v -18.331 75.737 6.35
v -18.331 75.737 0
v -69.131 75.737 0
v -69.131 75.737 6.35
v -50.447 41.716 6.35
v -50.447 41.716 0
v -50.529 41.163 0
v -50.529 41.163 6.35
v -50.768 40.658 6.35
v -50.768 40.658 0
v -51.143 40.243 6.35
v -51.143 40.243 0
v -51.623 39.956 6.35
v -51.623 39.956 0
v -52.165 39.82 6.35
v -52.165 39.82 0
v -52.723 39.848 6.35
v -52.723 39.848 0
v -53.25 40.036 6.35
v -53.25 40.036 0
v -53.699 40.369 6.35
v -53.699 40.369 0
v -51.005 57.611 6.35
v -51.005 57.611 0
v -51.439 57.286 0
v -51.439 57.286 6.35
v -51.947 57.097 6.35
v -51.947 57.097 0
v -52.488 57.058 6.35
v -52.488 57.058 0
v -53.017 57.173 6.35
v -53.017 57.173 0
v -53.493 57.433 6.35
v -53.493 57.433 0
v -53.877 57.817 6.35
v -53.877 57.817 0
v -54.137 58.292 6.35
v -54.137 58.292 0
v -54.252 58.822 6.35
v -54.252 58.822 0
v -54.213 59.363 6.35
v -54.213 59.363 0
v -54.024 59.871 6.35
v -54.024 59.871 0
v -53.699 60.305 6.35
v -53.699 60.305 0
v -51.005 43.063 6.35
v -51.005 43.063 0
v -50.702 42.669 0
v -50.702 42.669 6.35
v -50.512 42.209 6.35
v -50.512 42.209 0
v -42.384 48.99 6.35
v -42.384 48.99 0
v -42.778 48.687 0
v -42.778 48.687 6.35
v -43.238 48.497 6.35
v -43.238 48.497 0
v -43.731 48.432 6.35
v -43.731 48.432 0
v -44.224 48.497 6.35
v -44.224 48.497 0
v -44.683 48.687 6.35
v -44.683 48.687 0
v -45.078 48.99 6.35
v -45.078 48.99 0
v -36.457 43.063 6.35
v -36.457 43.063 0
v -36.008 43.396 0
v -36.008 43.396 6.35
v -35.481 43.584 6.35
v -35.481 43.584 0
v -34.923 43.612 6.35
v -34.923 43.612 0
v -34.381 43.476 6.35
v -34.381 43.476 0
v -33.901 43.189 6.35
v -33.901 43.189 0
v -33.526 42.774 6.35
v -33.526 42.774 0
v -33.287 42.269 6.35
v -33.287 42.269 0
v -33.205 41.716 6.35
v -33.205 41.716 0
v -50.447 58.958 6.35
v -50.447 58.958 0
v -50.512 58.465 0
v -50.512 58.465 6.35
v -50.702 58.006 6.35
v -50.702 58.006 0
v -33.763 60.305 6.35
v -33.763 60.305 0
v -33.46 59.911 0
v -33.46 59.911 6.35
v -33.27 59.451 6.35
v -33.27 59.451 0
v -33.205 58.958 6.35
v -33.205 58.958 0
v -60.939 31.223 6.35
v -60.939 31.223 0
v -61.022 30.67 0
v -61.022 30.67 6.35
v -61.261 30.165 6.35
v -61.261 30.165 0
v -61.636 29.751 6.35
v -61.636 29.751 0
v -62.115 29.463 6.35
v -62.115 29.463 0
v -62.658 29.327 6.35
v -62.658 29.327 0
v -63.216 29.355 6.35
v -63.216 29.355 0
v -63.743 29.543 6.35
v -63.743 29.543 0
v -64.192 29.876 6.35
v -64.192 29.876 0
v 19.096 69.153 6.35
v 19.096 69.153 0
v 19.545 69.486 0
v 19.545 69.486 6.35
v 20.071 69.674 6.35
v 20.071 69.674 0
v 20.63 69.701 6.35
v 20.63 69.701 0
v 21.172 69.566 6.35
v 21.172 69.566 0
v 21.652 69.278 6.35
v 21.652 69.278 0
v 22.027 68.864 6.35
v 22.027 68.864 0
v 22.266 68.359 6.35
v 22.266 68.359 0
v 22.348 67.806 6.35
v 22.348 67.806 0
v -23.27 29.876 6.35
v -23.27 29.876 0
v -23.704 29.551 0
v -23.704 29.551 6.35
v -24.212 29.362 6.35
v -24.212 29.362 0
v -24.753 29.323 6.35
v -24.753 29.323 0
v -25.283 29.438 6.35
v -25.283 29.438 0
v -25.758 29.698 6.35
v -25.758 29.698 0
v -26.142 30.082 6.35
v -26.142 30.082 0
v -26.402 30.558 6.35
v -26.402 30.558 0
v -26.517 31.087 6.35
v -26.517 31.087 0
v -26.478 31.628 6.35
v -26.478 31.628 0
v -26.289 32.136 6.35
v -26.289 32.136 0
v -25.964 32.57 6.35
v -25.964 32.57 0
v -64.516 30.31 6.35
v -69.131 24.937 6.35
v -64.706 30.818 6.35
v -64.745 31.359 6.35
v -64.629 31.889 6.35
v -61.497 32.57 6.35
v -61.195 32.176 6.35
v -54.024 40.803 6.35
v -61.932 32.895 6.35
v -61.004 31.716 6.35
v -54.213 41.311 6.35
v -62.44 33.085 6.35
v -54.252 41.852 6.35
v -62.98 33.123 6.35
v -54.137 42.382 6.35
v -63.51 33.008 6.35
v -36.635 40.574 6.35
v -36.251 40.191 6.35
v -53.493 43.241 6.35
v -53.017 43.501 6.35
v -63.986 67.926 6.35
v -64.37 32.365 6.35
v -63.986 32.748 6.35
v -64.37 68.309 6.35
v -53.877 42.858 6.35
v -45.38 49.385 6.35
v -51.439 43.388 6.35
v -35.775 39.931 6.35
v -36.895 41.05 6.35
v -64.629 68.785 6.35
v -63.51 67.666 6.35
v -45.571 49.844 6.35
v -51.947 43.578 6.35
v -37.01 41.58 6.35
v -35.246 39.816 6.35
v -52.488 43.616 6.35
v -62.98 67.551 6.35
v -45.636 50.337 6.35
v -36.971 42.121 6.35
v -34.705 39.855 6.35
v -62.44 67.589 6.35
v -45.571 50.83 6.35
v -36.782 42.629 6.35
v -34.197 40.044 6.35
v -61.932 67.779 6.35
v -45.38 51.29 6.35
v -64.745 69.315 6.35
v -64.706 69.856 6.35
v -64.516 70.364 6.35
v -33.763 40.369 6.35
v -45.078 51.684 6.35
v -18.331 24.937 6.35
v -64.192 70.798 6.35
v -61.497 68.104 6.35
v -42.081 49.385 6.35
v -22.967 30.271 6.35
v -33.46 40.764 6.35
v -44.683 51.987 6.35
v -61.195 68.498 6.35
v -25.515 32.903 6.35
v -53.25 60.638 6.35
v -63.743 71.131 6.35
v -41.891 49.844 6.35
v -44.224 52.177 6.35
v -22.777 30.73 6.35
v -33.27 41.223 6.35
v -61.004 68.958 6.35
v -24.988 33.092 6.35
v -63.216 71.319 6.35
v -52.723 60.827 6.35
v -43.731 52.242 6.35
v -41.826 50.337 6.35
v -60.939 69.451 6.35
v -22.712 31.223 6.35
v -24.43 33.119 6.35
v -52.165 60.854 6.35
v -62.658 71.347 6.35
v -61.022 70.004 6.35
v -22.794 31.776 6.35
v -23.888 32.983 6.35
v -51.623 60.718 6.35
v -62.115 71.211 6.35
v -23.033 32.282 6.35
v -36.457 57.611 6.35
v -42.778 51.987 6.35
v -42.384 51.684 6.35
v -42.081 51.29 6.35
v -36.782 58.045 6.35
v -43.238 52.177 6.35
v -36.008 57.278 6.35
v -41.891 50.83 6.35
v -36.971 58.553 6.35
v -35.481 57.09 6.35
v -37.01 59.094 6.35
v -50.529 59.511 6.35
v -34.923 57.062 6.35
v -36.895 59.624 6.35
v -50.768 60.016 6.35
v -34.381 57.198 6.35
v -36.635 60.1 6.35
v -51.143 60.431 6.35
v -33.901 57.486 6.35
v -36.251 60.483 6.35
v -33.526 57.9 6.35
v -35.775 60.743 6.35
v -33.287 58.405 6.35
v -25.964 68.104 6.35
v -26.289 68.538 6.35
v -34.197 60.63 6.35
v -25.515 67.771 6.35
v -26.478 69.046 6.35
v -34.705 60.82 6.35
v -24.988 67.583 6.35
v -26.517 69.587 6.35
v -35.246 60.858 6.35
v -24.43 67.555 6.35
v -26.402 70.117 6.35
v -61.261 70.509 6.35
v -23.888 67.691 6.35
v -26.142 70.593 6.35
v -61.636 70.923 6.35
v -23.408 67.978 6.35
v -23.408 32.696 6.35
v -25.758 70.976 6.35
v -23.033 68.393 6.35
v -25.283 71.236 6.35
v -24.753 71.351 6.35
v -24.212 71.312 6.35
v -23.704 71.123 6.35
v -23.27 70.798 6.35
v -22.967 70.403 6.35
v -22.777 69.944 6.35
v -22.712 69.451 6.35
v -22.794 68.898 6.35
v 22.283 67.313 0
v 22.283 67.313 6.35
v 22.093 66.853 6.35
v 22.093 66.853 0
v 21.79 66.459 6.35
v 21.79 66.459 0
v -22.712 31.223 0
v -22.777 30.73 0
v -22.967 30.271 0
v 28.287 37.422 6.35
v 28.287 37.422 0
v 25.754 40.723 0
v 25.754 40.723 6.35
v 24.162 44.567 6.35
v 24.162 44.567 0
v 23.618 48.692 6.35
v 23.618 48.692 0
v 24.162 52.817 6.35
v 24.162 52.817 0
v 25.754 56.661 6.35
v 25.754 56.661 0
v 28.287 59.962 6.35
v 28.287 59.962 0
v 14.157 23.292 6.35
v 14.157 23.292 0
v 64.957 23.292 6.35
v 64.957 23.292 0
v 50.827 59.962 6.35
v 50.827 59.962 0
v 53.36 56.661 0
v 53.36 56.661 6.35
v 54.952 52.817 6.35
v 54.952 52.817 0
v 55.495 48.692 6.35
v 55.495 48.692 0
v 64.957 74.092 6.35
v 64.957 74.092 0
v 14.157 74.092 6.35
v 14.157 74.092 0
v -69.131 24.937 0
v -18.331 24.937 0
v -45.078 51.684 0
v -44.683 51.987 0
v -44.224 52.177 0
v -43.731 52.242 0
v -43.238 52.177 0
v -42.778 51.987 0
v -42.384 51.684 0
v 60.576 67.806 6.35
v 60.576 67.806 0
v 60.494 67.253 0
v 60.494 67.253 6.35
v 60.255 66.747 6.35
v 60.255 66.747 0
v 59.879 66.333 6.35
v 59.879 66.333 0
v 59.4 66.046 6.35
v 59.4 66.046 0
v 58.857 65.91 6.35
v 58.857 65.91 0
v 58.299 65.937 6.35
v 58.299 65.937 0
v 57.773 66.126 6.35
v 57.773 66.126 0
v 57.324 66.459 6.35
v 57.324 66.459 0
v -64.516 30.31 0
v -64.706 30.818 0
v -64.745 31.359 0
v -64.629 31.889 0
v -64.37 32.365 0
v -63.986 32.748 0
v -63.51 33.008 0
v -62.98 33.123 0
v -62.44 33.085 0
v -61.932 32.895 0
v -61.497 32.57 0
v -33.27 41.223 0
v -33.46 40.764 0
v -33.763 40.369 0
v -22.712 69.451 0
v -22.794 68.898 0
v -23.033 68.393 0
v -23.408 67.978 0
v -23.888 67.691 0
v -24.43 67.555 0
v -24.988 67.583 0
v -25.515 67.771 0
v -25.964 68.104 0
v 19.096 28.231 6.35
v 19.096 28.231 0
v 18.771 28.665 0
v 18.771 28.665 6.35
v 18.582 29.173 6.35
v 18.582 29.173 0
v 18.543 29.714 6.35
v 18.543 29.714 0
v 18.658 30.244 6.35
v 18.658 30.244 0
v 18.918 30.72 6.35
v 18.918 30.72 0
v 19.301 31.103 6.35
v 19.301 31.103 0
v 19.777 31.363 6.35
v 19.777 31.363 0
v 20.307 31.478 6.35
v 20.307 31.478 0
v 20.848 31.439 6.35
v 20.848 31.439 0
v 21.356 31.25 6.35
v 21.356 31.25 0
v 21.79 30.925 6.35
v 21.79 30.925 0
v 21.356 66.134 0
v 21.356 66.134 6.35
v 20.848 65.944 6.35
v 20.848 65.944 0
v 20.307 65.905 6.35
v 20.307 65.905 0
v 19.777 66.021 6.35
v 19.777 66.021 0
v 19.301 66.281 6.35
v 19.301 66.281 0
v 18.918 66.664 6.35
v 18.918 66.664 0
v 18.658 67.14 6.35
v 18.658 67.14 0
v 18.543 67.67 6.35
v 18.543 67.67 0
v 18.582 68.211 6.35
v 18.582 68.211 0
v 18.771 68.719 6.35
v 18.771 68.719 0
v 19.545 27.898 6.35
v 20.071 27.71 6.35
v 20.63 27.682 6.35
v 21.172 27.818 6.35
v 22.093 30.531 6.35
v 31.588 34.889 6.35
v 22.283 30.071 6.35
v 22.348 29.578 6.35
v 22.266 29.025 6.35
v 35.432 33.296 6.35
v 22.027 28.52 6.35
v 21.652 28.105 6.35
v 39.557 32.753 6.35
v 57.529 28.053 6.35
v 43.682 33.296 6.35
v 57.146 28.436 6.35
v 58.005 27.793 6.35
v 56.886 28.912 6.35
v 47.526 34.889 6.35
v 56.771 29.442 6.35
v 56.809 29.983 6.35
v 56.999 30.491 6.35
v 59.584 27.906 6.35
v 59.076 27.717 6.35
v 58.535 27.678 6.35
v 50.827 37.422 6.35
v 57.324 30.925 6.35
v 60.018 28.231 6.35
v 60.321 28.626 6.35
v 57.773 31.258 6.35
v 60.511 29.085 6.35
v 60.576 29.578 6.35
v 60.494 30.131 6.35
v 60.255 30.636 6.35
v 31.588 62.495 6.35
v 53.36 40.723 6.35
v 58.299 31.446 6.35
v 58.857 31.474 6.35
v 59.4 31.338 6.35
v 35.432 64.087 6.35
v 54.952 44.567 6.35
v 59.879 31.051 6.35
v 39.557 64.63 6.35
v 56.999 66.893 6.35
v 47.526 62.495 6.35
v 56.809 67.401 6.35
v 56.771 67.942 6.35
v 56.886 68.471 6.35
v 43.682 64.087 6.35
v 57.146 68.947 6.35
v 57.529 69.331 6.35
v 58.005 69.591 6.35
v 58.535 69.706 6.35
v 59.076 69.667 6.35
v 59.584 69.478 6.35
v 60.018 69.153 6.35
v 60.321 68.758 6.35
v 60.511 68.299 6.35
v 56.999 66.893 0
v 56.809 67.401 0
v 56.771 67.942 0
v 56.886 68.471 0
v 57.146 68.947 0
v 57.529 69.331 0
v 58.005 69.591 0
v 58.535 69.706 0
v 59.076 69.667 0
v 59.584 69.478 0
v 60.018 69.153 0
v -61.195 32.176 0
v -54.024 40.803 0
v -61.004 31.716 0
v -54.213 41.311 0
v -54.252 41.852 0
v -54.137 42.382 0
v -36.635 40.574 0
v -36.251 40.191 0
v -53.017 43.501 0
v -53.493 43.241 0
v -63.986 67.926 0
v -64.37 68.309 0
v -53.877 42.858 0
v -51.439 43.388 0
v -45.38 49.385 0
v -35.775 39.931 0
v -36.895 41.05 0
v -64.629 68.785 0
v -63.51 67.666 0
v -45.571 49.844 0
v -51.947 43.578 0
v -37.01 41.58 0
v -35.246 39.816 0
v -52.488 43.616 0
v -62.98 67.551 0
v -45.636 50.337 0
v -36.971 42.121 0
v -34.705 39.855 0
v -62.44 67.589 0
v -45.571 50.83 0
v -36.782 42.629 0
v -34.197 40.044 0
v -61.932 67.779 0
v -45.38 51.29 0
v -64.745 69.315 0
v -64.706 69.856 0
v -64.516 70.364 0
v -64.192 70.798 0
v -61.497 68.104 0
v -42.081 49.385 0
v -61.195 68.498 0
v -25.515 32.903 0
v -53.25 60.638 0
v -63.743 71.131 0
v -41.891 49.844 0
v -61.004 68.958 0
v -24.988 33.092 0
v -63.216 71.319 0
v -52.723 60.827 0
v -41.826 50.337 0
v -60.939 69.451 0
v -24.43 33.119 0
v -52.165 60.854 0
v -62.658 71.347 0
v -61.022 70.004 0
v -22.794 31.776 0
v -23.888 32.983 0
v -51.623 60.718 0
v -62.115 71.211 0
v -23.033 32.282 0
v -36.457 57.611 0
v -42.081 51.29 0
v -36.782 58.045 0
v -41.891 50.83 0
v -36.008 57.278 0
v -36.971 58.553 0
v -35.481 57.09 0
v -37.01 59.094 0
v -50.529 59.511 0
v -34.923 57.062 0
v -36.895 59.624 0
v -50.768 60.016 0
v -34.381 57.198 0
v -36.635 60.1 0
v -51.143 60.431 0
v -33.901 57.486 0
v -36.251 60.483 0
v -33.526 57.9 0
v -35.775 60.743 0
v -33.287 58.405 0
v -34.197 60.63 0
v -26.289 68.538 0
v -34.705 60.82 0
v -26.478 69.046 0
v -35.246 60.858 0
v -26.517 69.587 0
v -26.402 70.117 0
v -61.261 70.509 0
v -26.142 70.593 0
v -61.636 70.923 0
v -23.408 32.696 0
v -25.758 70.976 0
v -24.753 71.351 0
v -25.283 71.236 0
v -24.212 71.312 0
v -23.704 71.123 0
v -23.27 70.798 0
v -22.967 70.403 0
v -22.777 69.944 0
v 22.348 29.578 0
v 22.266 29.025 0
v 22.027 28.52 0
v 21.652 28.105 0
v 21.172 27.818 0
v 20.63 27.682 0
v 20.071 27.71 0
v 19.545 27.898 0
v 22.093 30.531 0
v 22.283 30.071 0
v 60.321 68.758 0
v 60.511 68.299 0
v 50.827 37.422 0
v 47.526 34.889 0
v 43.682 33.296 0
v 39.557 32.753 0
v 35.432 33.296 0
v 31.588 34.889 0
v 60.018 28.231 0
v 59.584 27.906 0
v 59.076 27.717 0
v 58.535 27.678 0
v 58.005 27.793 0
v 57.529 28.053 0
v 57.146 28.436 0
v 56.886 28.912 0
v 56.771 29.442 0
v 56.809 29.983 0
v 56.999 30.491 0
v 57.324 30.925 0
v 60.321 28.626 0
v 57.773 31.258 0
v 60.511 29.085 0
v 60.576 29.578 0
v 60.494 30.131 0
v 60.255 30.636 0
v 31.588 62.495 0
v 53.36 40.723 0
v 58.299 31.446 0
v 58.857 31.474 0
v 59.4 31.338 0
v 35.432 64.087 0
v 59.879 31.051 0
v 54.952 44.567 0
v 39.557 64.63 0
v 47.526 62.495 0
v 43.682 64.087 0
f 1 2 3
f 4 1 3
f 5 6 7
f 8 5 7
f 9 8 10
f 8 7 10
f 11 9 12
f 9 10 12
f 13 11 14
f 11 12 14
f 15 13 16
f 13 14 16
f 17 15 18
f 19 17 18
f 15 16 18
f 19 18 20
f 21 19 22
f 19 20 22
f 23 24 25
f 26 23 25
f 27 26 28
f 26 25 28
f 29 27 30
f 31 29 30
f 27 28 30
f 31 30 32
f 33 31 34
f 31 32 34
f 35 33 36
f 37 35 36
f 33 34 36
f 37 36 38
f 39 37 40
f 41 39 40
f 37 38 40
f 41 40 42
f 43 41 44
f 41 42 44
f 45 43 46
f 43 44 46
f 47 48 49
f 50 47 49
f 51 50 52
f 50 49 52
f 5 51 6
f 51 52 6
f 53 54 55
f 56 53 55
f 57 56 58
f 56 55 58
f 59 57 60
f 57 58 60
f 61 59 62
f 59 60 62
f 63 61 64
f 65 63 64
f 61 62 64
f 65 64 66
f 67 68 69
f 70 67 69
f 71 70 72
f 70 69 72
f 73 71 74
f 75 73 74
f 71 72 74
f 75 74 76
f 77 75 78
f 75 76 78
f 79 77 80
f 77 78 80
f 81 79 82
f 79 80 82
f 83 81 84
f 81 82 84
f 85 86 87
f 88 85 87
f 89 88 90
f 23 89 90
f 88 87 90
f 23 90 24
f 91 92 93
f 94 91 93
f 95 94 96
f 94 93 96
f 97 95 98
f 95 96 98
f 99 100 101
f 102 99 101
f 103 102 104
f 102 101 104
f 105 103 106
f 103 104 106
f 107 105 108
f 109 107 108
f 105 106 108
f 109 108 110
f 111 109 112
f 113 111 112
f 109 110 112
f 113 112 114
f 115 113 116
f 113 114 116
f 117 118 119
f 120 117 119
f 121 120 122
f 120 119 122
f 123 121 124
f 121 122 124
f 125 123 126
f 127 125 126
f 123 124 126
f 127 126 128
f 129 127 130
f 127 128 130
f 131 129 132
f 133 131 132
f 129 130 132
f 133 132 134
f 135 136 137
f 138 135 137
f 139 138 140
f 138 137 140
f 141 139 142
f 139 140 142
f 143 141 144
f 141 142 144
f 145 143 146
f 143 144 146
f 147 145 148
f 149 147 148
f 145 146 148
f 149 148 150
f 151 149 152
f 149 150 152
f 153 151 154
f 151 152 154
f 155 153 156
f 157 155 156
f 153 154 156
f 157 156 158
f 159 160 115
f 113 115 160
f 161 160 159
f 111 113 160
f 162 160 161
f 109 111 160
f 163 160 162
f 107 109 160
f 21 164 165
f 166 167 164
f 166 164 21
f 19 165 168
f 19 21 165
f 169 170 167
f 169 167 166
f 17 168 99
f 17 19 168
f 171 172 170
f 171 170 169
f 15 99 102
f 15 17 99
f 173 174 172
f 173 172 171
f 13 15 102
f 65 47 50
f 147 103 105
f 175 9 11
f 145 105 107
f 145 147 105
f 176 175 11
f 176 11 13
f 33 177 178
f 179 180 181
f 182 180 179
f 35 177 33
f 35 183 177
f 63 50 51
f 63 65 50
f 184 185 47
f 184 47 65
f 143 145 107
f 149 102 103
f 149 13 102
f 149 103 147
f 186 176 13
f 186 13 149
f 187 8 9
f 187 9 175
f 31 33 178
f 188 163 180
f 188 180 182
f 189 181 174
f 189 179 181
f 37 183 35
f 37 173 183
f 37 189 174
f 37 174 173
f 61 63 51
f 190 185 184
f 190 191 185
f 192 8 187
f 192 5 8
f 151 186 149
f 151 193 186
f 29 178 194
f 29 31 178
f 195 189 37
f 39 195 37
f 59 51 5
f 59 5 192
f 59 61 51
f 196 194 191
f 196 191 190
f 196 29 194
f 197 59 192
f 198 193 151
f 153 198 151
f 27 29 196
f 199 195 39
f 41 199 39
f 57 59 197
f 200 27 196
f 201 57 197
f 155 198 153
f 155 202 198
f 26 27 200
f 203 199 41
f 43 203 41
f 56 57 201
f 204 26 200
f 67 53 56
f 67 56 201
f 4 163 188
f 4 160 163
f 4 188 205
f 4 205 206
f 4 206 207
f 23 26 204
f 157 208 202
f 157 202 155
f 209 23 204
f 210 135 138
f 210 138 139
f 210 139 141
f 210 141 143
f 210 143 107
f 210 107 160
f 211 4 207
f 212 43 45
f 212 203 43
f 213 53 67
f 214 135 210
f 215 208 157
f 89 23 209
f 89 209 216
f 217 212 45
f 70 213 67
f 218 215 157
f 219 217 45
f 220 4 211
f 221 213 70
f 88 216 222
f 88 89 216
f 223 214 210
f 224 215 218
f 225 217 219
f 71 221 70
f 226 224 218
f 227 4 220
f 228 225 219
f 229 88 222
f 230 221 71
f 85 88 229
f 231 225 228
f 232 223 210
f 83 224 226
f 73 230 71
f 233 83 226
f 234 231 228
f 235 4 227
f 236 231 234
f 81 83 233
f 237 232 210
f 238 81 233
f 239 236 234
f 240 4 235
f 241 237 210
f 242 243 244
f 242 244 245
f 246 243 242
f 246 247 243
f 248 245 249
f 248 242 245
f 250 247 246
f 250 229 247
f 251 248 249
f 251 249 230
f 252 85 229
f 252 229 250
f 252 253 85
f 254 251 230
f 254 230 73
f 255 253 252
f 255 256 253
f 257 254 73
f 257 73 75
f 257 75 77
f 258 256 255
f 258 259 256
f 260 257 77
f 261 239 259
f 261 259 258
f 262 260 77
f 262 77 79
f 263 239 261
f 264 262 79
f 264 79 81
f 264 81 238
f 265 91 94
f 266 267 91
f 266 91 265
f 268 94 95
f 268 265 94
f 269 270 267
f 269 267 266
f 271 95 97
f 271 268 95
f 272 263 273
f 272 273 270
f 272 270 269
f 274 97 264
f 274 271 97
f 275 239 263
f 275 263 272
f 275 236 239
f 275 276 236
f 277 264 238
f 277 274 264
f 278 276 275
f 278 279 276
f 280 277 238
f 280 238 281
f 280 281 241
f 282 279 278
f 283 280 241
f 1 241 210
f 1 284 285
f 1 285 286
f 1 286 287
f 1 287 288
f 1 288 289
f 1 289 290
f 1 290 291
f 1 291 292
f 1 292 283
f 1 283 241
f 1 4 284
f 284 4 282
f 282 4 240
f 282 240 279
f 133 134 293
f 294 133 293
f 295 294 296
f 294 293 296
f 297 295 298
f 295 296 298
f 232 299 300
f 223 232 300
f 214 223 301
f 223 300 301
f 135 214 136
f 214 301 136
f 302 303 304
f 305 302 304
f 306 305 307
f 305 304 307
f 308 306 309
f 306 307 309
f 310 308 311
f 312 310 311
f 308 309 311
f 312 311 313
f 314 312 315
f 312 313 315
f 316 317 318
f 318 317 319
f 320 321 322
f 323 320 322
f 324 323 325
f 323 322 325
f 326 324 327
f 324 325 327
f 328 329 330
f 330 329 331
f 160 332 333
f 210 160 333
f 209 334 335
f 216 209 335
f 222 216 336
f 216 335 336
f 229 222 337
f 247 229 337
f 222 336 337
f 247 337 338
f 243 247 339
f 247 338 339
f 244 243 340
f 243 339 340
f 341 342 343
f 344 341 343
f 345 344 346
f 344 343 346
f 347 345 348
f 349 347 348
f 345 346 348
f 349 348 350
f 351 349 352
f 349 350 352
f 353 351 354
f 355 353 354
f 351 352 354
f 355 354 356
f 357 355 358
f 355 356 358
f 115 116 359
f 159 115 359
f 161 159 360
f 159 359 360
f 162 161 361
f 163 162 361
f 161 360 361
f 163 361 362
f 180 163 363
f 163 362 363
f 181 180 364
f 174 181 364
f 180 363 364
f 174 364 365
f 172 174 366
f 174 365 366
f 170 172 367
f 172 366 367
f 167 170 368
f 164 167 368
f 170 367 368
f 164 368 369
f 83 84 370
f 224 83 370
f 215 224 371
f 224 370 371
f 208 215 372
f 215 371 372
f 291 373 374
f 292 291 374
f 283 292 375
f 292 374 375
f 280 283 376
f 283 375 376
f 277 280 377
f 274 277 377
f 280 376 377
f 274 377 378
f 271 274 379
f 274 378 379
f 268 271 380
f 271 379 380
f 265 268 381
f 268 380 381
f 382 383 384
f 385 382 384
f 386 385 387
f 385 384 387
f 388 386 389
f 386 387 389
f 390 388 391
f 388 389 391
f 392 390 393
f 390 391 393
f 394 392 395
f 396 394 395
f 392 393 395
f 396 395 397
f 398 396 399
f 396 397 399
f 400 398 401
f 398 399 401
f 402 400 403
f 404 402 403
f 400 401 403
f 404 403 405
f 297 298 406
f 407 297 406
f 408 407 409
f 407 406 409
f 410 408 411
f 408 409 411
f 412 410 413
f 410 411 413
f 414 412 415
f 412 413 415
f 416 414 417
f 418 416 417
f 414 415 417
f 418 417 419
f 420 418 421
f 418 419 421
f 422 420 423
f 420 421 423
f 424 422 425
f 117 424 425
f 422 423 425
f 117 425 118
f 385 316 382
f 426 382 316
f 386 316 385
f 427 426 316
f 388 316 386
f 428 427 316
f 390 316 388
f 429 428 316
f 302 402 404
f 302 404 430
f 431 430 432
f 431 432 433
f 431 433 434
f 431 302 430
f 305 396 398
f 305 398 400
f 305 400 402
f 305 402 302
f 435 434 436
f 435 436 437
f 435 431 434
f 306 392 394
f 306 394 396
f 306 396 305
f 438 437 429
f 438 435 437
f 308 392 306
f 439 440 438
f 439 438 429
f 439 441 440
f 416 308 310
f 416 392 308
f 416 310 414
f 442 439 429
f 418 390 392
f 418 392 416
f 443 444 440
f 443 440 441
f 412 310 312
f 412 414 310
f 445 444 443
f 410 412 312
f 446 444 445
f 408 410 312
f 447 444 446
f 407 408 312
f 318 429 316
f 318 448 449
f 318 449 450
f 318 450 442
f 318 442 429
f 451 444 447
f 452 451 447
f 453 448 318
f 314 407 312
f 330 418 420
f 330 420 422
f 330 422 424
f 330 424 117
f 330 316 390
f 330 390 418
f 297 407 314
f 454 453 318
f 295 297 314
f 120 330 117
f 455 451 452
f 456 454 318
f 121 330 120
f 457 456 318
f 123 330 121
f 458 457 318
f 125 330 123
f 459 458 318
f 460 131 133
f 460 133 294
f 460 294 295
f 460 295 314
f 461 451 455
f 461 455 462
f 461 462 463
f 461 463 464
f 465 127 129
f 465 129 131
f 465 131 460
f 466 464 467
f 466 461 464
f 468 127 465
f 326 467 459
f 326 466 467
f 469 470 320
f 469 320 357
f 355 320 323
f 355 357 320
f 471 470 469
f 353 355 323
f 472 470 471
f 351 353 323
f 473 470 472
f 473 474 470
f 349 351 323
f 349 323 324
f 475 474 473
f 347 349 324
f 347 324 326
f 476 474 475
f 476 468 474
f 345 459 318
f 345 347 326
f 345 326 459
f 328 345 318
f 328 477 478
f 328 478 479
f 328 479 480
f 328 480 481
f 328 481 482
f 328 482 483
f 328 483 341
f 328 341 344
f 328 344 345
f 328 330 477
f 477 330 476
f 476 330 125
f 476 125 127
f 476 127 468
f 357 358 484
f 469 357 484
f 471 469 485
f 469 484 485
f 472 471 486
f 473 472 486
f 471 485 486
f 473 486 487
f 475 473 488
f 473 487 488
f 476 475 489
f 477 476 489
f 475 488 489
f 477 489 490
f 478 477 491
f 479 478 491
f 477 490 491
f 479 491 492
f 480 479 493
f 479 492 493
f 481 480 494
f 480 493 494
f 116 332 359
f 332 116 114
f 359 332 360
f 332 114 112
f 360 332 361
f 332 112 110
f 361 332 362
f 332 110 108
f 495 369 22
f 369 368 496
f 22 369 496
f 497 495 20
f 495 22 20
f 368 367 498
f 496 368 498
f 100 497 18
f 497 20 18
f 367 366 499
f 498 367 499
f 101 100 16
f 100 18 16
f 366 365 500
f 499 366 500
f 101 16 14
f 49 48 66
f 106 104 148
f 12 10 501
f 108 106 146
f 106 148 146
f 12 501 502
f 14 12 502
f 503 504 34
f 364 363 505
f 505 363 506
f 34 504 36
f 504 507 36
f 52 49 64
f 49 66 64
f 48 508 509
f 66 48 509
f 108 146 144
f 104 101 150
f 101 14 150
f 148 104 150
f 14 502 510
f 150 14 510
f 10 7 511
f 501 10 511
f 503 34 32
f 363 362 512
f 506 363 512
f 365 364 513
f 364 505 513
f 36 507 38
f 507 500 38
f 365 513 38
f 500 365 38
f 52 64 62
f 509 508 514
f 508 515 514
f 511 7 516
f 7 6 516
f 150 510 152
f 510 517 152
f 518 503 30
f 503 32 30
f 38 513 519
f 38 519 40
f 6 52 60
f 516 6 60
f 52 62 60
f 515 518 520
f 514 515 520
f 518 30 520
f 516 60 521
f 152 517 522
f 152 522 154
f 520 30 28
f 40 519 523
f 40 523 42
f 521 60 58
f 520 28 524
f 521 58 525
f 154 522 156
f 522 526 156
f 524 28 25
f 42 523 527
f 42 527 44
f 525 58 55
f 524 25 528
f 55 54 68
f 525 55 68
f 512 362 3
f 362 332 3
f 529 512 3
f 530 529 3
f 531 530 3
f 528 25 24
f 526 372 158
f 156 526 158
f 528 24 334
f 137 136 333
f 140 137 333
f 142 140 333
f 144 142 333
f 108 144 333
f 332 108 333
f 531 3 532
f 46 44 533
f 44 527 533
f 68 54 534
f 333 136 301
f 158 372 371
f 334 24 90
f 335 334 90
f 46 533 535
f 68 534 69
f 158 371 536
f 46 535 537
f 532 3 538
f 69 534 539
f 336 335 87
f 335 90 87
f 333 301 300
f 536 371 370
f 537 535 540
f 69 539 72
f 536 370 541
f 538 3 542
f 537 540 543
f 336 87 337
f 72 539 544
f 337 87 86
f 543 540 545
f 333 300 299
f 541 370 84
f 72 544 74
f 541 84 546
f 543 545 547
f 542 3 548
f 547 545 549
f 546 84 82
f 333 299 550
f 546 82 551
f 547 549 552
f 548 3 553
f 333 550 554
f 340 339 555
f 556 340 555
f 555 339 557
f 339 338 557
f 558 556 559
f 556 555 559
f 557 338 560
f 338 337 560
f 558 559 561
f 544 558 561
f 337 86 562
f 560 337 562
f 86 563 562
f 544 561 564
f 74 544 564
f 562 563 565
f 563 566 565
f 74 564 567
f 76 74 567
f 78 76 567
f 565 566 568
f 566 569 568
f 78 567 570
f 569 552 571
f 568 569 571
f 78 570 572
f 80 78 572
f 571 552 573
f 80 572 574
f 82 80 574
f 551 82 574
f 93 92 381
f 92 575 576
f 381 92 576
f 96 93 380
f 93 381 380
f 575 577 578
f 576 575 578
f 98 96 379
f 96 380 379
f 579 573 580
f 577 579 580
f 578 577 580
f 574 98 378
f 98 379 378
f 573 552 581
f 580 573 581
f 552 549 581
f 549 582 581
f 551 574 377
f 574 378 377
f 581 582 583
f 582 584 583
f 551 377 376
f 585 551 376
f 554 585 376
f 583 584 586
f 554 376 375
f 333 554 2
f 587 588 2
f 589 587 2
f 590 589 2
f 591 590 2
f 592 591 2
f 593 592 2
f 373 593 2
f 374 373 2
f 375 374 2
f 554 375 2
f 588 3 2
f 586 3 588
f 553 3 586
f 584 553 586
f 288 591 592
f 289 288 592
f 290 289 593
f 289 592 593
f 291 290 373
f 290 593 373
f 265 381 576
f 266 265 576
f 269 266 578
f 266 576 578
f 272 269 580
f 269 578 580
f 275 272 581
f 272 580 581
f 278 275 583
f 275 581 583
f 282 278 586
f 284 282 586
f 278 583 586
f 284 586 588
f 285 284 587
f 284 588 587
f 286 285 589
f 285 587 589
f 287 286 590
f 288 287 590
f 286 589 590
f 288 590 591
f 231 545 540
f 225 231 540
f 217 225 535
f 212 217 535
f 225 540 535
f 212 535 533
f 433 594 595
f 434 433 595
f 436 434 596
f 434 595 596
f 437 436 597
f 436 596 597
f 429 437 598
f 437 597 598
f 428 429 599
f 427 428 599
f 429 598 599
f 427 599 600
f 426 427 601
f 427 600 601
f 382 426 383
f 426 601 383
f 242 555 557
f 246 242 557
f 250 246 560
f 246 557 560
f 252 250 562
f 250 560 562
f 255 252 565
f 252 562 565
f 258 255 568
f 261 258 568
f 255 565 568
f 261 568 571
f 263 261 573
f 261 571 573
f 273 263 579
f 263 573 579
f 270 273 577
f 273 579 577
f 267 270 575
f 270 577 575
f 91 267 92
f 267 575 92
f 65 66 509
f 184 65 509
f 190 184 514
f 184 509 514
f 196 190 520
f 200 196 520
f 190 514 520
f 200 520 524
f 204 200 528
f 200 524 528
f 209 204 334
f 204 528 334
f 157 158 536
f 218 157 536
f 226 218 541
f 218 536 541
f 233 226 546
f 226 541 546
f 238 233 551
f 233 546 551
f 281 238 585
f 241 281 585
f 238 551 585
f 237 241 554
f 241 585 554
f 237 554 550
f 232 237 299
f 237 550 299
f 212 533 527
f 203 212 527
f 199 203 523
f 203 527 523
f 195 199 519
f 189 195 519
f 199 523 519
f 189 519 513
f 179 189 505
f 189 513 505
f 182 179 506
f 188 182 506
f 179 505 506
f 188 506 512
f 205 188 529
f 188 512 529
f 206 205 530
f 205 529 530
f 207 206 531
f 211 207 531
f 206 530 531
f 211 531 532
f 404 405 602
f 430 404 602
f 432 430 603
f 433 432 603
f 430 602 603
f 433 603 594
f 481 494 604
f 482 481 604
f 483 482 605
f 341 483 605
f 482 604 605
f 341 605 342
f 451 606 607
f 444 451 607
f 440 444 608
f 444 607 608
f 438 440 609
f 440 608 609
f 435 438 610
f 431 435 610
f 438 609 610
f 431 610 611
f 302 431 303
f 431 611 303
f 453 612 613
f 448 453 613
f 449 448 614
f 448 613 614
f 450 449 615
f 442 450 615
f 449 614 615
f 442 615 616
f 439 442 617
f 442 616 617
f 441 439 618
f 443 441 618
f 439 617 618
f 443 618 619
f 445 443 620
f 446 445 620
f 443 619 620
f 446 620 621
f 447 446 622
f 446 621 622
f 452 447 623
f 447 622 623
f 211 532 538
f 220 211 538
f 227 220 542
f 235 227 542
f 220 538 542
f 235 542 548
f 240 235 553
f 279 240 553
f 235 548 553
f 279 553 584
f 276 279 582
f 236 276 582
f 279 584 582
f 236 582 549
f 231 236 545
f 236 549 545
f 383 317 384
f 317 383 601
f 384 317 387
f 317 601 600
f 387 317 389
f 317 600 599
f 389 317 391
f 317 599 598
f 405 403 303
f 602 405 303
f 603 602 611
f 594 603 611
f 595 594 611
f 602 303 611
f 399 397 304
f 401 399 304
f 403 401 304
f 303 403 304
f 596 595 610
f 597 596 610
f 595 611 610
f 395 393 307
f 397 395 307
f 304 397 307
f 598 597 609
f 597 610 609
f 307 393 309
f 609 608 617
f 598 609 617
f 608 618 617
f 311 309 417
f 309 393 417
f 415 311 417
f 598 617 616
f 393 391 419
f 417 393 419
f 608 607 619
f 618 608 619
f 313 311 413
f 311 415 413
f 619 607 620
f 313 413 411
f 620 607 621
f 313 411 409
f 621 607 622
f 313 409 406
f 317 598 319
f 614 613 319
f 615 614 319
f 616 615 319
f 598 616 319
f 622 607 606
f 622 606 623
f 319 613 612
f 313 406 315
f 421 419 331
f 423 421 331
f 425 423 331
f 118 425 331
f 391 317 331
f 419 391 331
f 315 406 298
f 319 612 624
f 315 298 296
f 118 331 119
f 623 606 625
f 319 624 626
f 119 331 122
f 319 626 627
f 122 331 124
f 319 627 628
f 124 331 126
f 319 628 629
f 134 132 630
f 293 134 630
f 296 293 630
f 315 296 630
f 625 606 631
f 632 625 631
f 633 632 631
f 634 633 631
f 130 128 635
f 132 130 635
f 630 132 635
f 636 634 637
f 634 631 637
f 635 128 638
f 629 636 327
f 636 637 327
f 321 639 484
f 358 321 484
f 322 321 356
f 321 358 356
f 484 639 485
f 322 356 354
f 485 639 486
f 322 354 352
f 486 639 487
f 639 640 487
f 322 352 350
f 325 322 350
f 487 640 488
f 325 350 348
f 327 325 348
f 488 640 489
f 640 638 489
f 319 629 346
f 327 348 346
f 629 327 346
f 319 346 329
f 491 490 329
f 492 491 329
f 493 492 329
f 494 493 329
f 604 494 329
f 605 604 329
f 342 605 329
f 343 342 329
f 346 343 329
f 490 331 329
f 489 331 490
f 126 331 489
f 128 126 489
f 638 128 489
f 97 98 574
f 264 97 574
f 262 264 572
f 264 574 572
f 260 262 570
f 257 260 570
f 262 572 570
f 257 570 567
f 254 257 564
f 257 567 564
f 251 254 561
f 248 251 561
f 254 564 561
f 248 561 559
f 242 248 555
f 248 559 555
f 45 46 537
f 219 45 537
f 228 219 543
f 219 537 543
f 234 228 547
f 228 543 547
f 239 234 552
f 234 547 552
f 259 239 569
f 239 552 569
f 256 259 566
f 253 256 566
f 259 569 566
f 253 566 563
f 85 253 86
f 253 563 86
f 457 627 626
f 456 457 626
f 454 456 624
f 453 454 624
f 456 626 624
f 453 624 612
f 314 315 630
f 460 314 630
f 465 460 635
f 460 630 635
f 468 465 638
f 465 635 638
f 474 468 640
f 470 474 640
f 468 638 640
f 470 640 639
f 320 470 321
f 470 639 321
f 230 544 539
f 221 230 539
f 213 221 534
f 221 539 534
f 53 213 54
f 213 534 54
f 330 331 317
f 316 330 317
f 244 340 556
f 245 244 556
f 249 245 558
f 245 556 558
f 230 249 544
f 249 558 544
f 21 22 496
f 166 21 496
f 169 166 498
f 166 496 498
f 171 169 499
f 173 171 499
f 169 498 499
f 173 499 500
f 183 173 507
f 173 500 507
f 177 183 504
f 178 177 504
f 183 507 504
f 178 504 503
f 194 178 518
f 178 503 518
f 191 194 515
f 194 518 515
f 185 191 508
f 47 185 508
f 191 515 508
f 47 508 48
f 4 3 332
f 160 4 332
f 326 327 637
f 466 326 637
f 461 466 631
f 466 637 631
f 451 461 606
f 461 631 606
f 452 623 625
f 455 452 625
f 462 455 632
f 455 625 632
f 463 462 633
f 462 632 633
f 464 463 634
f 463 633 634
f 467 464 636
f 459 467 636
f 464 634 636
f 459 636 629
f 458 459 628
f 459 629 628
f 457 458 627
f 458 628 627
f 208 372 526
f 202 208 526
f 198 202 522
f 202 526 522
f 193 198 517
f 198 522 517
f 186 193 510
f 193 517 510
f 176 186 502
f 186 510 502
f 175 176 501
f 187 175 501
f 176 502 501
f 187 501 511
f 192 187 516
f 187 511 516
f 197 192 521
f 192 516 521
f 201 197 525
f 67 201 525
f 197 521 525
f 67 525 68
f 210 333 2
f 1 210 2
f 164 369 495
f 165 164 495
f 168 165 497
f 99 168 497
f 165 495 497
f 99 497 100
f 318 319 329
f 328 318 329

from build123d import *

# Parameters (mm, degrees)
F1_DEPTH = 6.35
F3_DEPTH = 6.35


with BuildPart() as f1:
    # F0 (on Top) → F1 (new body)
    with BuildSketch(Plane.XY):
        with BuildLine():
            Line((-64.19153, 70.797941), (-69.130671, 75.737081))
            Line((-69.130671, 75.737081), (-69.130671, 24.937081))
            Line((-69.130671, 24.937081), (-64.19153, 29.876222))
            ThreePointArc((-64.19153, 29.876222), (-64.19153, 32.570299), (-61.497453, 32.570299))
            Line((-61.497453, 32.570299), (-53.698755, 40.368997))
            ThreePointArc((-53.698755, 40.368997), (-53.698755, 43.063074), (-51.004679, 43.063074))
            Line((-51.004679, 43.063074), (-45.07771, 48.990043))
            ThreePointArc((-45.07771, 48.990043), (-45.635671, 50.337081), (-45.07771, 51.68412))
            Line((-45.07771, 51.68412), (-51.004679, 57.611089))
            ThreePointArc((-51.004679, 57.611089), (-53.698755, 57.611089), (-53.698755, 60.305166))
            Line((-53.698755, 60.305166), (-61.497453, 68.103864))
            ThreePointArc((-61.497453, 68.103864), (-64.19153, 68.103864), (-64.19153, 70.797941))
        make_face()
        with BuildLine():
            Line((-18.330671, 75.737081), (-69.130671, 75.737081))
            Line((-69.130671, 75.737081), (-64.19153, 70.797941))
            ThreePointArc((-64.19153, 70.797941), (-62.11548, 71.210893), (-60.939492, 69.450902))
            ThreePointArc((-60.939492, 69.450902), (-61.084501, 68.72189), (-61.497453, 68.103864))
            Line((-61.497453, 68.103864), (-53.698755, 60.305166))
            ThreePointArc((-53.698755, 60.305166), (-51.622705, 60.718118), (-50.446717, 58.958127))
            ThreePointArc((-50.446717, 58.958127), (-50.591726, 58.229115), (-51.004679, 57.611089))
            Line((-51.004679, 57.611089), (-45.07771, 51.68412))
            ThreePointArc((-45.07771, 51.68412), (-43.730671, 52.242081), (-42.383633, 51.68412))
            Line((-42.383633, 51.68412), (-36.456664, 57.611089))
            ThreePointArc((-36.456664, 57.611089), (-36.456664, 60.305166), (-33.762587, 60.305166))
            Line((-33.762587, 60.305166), (-25.963889, 68.103864))
            ThreePointArc((-25.963889, 68.103864), (-25.963889, 70.797941), (-23.269812, 70.797941))
            Line((-23.269812, 70.797941), (-18.330671, 75.737081))
        make_face()
        with BuildLine():
            Line((-18.330671, 24.937081), (-18.330671, 75.737081))
            Line((-18.330671, 75.737081), (-23.269812, 70.797941))
            ThreePointArc((-23.269812, 70.797941), (-22.85686, 70.179914), (-22.71185, 69.450902))
            ThreePointArc((-22.71185, 69.450902), (-23.887838, 67.690912), (-25.963889, 68.103864))
            Line((-25.963889, 68.103864), (-33.762587, 60.305166))
            ThreePointArc((-33.762587, 60.305166), (-33.349635, 59.687139), (-33.204625, 58.958127))
            ThreePointArc((-33.204625, 58.958127), (-34.380613, 57.198137), (-36.456664, 57.611089))
            Line((-36.456664, 57.611089), (-42.383633, 51.68412))
            ThreePointArc((-42.383633, 51.68412), (-41.970681, 51.066093), (-41.825671, 50.337081))
            ThreePointArc((-41.825671, 50.337081), (-41.970681, 49.608069), (-42.383633, 48.990043))
            Line((-42.383633, 48.990043), (-36.456664, 43.063074))
            ThreePointArc((-36.456664, 43.063074), (-34.380613, 43.476026), (-33.204625, 41.716036))
            ThreePointArc((-33.204625, 41.716036), (-33.349635, 40.987024), (-33.762587, 40.368997))
            Line((-33.762587, 40.368997), (-25.963889, 32.570299))
            ThreePointArc((-25.963889, 32.570299), (-23.887838, 32.983251), (-22.71185, 31.223261))
            ThreePointArc((-22.71185, 31.223261), (-22.85686, 30.494249), (-23.269812, 29.876222))
            Line((-23.269812, 29.876222), (-18.330671, 24.937081))
        make_face()
        with BuildLine():
            Line((-64.19153, 29.876222), (-69.130671, 24.937081))
            Line((-69.130671, 24.937081), (-18.330671, 24.937081))
            Line((-18.330671, 24.937081), (-23.269812, 29.876222))
            ThreePointArc((-23.269812, 29.876222), (-25.963889, 29.876222), (-25.963889, 32.570299))
            Line((-25.963889, 32.570299), (-33.762587, 40.368997))
            ThreePointArc((-33.762587, 40.368997), (-36.456664, 40.368997), (-36.456664, 43.063074))
            Line((-36.456664, 43.063074), (-42.383633, 48.990043))
            ThreePointArc((-42.383633, 48.990043), (-43.730671, 48.432081), (-45.07771, 48.990043))
            Line((-45.07771, 48.990043), (-51.004679, 43.063074))
            ThreePointArc((-51.004679, 43.063074), (-50.591726, 42.445047), (-50.446717, 41.716036))
            ThreePointArc((-50.446717, 41.716036), (-51.622705, 39.956045), (-53.698755, 40.368997))
            Line((-53.698755, 40.368997), (-61.497453, 32.570299))
            ThreePointArc((-61.497453, 32.570299), (-61.084501, 31.952273), (-60.939492, 31.223261))
            ThreePointArc((-60.939492, 31.223261), (-62.11548, 29.46327), (-64.19153, 29.876222))
        make_face()
    extrude(amount=F1_DEPTH)


with BuildPart() as f3:
    # F2 (on Top) → F3 (new body)
    with BuildSketch(Plane.XY):
        with BuildLine():
            Line((19.096085, 69.152684), (14.156944, 74.091825))
            Line((14.156944, 74.091825), (14.156944, 23.291825))
            Line((14.156944, 23.291825), (19.096085, 28.230966))
            ThreePointArc((19.096085, 28.230966), (19.096085, 30.925043), (21.790162, 30.925043))
            Line((21.790162, 30.925043), (28.286722, 37.421604))
            ThreePointArc((28.286722, 37.421604), (23.618444, 48.691825), (28.286722, 59.962047))
            Line((28.286722, 59.962047), (21.790162, 66.458607))
            ThreePointArc((21.790162, 66.458607), (19.096085, 66.458607), (19.096085, 69.152684))
        make_face()
        with BuildLine():
            Line((64.956944, 74.091825), (14.156944, 74.091825))
            Line((14.156944, 74.091825), (19.096085, 69.152684))
            ThreePointArc((19.096085, 69.152684), (21.172135, 69.565636), (22.348123, 67.805646))
            ThreePointArc((22.348123, 67.805646), (22.203114, 67.076634), (21.790162, 66.458607))
            Line((21.790162, 66.458607), (28.286722, 59.962047))
            ThreePointArc((28.286722, 59.962047), (39.556944, 64.630325), (50.827165, 59.962047))
            Line((50.827165, 59.962047), (57.323726, 66.458607))
            ThreePointArc((57.323726, 66.458607), (57.323726, 69.152684), (60.017803, 69.152684))
            Line((60.017803, 69.152684), (64.956944, 74.091825))
        make_face()
        with BuildLine():
            Line((64.956944, 23.291825), (64.956944, 74.091825))
            Line((64.956944, 74.091825), (60.017803, 69.152684))
            ThreePointArc((60.017803, 69.152684), (60.430755, 68.534658), (60.575765, 67.805646))
            ThreePointArc((60.575765, 67.805646), (59.399776, 66.045655), (57.323726, 66.458607))
            Line((57.323726, 66.458607), (50.827165, 59.962047))
            ThreePointArc((50.827165, 59.962047), (54.282198, 54.791225), (55.495444, 48.691825))
            ThreePointArc((55.495444, 48.691825), (54.282198, 42.592425), (50.827165, 37.421604))
            Line((50.827165, 37.421604), (57.323726, 30.925043))
            ThreePointArc((57.323726, 30.925043), (59.399776, 31.337995), (60.575765, 29.578004))
            ThreePointArc((60.575765, 29.578004), (60.430755, 28.848992), (60.017803, 28.230966))
            Line((60.017803, 28.230966), (64.956944, 23.291825))
        make_face()
        with BuildLine():
            Line((19.096085, 28.230966), (14.156944, 23.291825))
            Line((14.156944, 23.291825), (64.956944, 23.291825))
            Line((64.956944, 23.291825), (60.017803, 28.230966))
            ThreePointArc((60.017803, 28.230966), (57.323726, 28.230966), (57.323726, 30.925043))
            Line((57.323726, 30.925043), (50.827165, 37.421604))
            ThreePointArc((50.827165, 37.421604), (39.556944, 32.753325), (28.286722, 37.421604))
            Line((28.286722, 37.421604), (21.790162, 30.925043))
            ThreePointArc((21.790162, 30.925043), (22.203114, 30.307016), (22.348123, 29.578004))
            ThreePointArc((22.348123, 29.578004), (21.172135, 27.818014), (19.096085, 28.230966))
        make_face()
    extrude(amount=F3_DEPTH)


solid = Compound([f1.part, f3.part])
